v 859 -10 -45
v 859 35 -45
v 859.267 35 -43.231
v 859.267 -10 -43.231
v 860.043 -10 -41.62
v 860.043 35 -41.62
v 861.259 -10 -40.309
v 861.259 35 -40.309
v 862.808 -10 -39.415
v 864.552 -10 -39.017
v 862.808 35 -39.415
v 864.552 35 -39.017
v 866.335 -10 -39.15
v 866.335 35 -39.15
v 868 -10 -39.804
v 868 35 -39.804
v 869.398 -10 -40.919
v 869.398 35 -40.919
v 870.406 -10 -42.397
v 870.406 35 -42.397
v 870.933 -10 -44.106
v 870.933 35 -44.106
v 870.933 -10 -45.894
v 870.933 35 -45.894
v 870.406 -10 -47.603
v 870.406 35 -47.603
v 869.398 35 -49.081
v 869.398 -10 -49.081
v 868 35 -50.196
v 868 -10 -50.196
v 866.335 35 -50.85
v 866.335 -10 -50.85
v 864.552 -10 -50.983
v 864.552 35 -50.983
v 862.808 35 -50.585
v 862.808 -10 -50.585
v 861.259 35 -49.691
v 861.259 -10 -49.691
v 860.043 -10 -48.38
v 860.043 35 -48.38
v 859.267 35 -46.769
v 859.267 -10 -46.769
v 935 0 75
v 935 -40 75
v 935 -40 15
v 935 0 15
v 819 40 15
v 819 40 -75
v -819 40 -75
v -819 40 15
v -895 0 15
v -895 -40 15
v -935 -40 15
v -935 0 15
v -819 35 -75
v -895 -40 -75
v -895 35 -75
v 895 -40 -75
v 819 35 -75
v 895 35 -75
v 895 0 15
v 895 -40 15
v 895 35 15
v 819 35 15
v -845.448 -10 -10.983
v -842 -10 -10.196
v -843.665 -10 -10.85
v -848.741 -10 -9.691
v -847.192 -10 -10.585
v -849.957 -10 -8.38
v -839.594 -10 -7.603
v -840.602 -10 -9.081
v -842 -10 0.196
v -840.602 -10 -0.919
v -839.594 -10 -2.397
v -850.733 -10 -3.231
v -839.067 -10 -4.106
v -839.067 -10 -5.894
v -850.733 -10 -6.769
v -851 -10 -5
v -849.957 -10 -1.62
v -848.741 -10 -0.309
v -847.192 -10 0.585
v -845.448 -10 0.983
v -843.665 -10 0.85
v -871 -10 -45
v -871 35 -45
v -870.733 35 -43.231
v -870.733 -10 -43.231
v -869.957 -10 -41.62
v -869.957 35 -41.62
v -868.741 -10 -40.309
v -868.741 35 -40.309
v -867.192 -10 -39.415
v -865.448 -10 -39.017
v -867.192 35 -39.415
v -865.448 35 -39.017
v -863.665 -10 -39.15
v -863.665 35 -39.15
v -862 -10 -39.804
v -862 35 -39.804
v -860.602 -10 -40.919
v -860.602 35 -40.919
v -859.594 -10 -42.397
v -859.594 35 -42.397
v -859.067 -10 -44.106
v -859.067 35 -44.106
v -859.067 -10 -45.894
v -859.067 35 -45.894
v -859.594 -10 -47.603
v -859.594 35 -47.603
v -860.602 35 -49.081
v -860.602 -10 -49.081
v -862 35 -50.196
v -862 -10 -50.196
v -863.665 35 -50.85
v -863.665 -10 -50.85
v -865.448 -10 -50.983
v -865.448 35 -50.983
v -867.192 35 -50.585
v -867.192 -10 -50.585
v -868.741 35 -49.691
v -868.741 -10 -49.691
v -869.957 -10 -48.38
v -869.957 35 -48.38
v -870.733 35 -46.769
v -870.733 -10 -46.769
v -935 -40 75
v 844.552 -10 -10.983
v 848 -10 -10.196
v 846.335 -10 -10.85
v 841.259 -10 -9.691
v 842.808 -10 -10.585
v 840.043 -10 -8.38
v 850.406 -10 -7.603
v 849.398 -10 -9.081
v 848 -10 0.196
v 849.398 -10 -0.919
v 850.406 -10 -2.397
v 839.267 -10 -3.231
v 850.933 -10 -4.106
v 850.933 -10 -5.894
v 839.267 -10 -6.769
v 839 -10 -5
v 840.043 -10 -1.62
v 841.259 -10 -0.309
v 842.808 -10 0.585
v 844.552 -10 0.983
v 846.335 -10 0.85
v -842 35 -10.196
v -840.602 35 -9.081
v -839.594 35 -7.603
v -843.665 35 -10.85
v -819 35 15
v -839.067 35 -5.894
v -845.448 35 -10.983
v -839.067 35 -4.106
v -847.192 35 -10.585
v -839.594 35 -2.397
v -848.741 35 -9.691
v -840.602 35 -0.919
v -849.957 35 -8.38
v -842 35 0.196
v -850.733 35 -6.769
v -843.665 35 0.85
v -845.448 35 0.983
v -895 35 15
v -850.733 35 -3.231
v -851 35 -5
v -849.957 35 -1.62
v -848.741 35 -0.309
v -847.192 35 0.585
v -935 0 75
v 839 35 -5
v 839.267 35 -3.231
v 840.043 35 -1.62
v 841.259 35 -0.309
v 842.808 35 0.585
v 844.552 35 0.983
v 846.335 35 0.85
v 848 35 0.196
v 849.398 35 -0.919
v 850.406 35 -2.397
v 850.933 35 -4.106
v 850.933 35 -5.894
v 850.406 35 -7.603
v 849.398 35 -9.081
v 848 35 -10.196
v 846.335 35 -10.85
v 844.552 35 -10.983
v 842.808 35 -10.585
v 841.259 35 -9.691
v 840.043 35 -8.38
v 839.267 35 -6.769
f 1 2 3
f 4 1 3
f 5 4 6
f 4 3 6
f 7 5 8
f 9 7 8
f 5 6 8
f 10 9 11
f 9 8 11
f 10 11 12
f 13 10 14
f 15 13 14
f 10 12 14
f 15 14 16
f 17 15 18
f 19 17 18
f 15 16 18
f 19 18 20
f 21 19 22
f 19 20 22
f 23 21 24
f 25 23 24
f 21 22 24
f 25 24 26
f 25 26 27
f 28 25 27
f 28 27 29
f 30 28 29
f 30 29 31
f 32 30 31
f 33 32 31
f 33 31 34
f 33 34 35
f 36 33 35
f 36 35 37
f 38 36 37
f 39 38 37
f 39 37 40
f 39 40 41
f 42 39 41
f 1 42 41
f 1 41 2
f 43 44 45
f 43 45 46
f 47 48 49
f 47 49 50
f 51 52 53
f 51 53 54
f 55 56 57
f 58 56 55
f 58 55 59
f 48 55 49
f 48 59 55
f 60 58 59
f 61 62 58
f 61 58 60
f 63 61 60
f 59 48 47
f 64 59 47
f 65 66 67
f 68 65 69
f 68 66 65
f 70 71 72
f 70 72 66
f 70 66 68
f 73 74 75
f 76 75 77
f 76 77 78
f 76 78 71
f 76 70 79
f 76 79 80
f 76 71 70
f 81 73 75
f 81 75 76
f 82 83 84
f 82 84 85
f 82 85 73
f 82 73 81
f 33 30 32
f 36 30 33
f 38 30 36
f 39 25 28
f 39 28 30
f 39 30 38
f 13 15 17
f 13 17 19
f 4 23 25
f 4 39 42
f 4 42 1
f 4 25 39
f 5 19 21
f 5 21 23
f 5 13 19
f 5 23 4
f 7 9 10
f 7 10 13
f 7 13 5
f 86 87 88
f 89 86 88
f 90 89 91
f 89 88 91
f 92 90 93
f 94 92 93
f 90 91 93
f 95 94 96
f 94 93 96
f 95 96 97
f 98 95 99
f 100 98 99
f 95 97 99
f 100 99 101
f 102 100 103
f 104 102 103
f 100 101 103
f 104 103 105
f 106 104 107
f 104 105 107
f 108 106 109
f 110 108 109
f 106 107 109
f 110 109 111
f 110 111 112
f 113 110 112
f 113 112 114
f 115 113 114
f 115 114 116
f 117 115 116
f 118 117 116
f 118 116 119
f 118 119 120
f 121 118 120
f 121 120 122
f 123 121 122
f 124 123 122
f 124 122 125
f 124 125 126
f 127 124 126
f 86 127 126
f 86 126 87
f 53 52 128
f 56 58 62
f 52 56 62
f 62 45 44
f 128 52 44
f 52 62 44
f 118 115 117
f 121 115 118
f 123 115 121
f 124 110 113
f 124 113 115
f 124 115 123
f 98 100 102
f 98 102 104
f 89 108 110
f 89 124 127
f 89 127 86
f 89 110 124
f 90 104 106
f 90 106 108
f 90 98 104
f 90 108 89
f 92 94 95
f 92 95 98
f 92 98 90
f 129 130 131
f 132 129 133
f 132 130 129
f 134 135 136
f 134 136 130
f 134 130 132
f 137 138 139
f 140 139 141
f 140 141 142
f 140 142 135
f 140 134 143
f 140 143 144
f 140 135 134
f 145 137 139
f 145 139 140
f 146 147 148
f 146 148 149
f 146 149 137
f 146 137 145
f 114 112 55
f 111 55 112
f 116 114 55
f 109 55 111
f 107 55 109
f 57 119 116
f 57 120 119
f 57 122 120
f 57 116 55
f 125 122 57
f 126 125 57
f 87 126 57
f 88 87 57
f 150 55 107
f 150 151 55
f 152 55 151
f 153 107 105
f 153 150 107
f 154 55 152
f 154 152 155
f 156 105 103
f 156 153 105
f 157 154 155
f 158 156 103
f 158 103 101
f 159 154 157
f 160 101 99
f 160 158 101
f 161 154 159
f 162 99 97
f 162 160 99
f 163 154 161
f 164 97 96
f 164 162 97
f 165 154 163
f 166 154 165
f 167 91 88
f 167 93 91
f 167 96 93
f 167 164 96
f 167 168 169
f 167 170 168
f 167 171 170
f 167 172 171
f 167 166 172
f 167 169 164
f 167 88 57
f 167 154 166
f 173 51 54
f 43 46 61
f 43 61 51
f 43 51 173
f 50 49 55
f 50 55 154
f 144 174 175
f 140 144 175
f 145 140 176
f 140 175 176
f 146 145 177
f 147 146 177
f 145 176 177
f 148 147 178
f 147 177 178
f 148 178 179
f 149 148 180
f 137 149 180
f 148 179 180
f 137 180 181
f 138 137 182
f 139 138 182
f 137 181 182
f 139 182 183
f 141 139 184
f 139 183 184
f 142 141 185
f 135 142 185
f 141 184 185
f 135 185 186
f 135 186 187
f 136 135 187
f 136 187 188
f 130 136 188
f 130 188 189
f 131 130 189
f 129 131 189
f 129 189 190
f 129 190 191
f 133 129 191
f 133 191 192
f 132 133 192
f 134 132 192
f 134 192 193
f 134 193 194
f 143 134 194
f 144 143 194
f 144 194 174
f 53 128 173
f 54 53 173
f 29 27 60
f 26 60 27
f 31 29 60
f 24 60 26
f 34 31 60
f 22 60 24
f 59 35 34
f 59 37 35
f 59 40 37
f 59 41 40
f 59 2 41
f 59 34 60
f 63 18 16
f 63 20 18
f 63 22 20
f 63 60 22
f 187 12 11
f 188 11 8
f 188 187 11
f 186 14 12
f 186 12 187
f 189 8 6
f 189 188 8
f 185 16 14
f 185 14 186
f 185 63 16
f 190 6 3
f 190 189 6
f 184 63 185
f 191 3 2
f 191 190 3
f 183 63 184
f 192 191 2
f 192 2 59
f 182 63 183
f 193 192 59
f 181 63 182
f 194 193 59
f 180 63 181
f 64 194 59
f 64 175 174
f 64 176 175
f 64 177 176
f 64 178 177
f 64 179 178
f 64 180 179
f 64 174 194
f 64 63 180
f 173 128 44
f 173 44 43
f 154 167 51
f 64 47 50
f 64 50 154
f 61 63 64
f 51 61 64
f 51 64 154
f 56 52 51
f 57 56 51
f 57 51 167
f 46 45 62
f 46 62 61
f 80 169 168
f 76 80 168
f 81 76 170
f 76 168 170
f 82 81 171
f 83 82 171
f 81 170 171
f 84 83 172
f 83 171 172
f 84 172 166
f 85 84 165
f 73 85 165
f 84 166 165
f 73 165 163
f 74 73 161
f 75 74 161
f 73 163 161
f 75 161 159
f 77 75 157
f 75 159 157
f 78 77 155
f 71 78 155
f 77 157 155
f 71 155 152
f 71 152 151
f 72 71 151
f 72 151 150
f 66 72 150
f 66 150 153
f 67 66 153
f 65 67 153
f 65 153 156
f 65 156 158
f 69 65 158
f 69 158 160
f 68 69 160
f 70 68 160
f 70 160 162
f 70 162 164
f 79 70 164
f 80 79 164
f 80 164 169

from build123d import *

# Parameters (mm, degrees)
F3_DEPTH = 895
F4_R     = 6
F5_DEPTH = 50
F6_W     = 76
F6_H     = 90
F7_DEPTH = 5
F8_W     = 40
F8_H     = 60
F9_DEPTH = 935


with BuildPart() as f3:
    # F2 (on Right) → F3 (new body, symmetric)
    with BuildSketch(Plane.YZ):
        Polygon((-40, 75), (-40, -75), (40, -75), (40, 15), (0, 15), (0, 75), align=None)
    extrude(amount=F3_DEPTH, both=True)

    # F4 (on face) → F5 (cut)
    with BuildSketch(Plane(origin=(0, 40, 0), x_dir=(-1, 0, 0), z_dir=(0, 1, 0))):
        with Locations((-865, -45)):
            Circle(F4_R)
        with Locations((-845, -5)):
            Circle(F4_R)
        with Locations((845, -5)):
            Circle(F4_R)
        with Locations((865, -45)):
            Circle(F4_R)
    extrude(amount=-F5_DEPTH, mode=Mode.SUBTRACT)

    # F6 (on face) → F7 (cut)
    with BuildSketch(Plane(origin=(0, 40, 0), x_dir=(-1, 0, 0), z_dir=(0, 1, 0))):
        with Locations((-857, -30)):
            Rectangle(F6_W, F6_H)
        with Locations((857, -30)):
            Rectangle(F6_W, F6_H)
    extrude(amount=-F7_DEPTH, mode=Mode.SUBTRACT)

    # F8 (on Right) → F9 (join, symmetric)
    with BuildSketch(Plane.YZ):
        with Locations((-20, 45)):
            Rectangle(F8_W, F8_H)
    extrude(amount=F9_DEPTH, both=True)


solid = f3.part
